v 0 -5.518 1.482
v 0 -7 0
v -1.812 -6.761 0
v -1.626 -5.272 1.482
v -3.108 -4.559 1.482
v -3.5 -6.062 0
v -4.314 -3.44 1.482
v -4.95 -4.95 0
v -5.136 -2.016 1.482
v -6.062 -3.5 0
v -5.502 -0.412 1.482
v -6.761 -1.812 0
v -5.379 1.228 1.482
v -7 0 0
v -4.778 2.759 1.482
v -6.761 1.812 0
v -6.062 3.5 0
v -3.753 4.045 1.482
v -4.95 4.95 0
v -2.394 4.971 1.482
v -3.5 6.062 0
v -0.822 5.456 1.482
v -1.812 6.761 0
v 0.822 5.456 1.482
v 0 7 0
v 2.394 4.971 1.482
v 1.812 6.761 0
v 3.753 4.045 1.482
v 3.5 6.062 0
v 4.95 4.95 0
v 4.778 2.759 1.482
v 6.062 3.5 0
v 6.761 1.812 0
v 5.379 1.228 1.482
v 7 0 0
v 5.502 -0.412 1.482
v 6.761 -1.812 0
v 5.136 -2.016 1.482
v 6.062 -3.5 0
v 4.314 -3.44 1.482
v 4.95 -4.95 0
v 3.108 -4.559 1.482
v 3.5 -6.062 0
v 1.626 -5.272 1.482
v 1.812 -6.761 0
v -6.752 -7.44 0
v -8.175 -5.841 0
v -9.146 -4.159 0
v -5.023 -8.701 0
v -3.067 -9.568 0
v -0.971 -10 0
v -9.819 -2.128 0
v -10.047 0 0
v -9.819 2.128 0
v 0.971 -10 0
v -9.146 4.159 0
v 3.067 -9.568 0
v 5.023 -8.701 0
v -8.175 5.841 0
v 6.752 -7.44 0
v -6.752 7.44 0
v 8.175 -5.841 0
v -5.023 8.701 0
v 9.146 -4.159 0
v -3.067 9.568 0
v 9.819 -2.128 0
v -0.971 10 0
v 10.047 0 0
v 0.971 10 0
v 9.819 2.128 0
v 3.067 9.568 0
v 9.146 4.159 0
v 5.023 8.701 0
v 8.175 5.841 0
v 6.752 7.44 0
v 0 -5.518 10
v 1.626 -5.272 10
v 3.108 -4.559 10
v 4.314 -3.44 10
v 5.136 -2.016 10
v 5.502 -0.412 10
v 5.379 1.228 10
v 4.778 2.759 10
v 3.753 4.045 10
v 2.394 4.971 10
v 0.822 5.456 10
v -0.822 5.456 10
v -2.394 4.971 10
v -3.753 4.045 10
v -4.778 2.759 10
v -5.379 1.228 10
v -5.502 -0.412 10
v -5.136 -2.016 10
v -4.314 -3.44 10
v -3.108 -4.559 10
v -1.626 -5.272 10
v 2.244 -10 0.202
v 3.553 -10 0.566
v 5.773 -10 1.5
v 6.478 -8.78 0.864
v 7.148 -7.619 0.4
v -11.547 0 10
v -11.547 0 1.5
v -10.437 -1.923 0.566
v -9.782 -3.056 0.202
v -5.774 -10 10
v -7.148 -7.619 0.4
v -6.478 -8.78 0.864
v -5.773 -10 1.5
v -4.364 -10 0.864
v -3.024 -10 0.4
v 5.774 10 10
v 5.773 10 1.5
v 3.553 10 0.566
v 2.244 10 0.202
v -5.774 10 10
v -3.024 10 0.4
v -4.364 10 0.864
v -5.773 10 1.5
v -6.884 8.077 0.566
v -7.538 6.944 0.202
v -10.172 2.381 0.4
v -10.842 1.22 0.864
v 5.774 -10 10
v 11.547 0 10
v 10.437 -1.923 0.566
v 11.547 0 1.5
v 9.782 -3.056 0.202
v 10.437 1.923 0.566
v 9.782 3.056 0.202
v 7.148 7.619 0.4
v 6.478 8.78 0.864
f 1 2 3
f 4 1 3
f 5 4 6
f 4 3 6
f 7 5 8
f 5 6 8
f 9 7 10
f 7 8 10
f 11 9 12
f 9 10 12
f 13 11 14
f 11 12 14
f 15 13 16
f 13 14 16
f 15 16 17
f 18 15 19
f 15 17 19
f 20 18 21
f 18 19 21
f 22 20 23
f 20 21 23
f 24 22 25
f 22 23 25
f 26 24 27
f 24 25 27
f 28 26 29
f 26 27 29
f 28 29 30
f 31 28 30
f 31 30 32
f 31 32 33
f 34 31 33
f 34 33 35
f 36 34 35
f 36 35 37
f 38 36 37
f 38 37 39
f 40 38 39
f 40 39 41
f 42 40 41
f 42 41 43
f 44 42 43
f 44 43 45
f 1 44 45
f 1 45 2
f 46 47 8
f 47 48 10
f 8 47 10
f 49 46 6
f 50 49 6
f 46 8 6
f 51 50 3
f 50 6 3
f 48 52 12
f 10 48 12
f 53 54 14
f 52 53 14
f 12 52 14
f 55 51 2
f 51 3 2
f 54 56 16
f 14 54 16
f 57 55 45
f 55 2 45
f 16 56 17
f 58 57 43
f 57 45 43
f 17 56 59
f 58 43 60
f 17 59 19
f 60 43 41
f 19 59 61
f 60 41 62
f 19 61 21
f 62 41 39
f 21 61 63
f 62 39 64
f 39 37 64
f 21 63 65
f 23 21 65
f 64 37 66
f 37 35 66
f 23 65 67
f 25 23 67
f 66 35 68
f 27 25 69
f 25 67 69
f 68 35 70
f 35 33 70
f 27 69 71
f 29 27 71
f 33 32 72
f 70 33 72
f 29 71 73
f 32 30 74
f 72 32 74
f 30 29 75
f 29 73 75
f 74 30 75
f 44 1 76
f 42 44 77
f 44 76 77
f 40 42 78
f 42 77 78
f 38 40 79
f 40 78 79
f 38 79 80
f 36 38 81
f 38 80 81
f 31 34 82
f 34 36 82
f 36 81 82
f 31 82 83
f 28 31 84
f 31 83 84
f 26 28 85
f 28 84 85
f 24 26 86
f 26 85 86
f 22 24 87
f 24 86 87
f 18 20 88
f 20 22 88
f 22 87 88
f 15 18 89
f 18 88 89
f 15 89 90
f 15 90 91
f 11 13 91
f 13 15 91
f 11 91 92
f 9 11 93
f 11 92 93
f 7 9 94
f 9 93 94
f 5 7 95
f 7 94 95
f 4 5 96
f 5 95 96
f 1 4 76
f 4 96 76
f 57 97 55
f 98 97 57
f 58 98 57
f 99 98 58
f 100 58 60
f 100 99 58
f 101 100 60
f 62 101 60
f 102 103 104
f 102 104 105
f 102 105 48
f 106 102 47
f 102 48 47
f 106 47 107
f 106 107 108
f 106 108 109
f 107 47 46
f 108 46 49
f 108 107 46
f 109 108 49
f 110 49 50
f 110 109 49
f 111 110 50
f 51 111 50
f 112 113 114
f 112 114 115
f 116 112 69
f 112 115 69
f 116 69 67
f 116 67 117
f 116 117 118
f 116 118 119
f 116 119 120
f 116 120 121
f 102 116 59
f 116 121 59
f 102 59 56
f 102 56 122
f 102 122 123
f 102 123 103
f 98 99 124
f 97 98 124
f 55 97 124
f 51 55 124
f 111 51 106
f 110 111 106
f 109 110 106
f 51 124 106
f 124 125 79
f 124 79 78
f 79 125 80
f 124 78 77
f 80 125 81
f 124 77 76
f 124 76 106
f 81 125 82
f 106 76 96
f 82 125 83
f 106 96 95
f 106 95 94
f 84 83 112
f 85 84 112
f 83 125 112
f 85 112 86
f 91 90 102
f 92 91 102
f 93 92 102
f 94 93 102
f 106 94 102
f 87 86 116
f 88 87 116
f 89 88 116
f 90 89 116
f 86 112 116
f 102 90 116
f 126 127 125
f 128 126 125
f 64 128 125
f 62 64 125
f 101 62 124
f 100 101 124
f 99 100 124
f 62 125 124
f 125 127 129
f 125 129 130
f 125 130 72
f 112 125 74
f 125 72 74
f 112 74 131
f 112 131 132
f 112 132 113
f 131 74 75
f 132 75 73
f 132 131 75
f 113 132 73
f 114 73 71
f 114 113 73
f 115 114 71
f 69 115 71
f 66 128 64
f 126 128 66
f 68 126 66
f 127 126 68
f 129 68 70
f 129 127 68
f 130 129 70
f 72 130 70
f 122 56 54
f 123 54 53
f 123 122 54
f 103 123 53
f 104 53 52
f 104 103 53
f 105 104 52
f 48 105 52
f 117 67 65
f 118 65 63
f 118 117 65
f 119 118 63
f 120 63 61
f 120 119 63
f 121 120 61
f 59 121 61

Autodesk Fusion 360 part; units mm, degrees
sketch "Sketch1" plane through (0, 0, 0) normal (0, 0, 1) x (1, 0, 0) in component "nut"
  line L0 (11.547, 0) -> (5.7735, 10)
  line L1 (5.7735, 10) -> (-5.7735, 10)
  line L2 (-5.7735, 10) -> (-11.547, 0)
  line L3 (-11.547, 0) -> (-5.7735, -10)
  line L4 (-5.7735, -10) -> (5.7735, -10)
  line L5 (5.7735, -10) -> (11.547, 0)
  dimension "d1" = 10
extrude "Extrude1" add sketch "Sketch1" along normal blind 10 in component "nut"
sketch "Sketch2" plane through (0, 0, 0) normal (0, 1, 0) x (1, 0, 0) in component "nut"
  line L0 (11.547, -10) -> (10.047, -10)
  line L1 (10.047, -10) -> (11.547, -8.5)
  line L2 (11.547, -8.5) -> (11.547, -10)
  point P0 (11.547, -10)
  dimension "d4" = 1.5
revolve "Revolve1" cut sketch "Sketch2" angle 360 about axis through (0, 0, 1.75) along (0, 0, 1) in component "nut"
hole "Hole1" at (0, 0, 10) direction (0, 0, -1) diameter 11.035 end through all countersink diameter 14 countersink angle 90 in component "nut"
ref_plane "WorkPlane1" through (0, 0, 5) normal (0, 0, 1) x (1, 0, 0) in component "nut"
mirror "Mirror1" about plane through (0, 0, 5) normal (0, 0, 1) of "Extrude1", "Revolve1", "Hole1" in component "nut"
component "nut" placed x (1, 0, 0) y (0, 1, 0) z (0, 0, 1) at (0, 0, 0)
